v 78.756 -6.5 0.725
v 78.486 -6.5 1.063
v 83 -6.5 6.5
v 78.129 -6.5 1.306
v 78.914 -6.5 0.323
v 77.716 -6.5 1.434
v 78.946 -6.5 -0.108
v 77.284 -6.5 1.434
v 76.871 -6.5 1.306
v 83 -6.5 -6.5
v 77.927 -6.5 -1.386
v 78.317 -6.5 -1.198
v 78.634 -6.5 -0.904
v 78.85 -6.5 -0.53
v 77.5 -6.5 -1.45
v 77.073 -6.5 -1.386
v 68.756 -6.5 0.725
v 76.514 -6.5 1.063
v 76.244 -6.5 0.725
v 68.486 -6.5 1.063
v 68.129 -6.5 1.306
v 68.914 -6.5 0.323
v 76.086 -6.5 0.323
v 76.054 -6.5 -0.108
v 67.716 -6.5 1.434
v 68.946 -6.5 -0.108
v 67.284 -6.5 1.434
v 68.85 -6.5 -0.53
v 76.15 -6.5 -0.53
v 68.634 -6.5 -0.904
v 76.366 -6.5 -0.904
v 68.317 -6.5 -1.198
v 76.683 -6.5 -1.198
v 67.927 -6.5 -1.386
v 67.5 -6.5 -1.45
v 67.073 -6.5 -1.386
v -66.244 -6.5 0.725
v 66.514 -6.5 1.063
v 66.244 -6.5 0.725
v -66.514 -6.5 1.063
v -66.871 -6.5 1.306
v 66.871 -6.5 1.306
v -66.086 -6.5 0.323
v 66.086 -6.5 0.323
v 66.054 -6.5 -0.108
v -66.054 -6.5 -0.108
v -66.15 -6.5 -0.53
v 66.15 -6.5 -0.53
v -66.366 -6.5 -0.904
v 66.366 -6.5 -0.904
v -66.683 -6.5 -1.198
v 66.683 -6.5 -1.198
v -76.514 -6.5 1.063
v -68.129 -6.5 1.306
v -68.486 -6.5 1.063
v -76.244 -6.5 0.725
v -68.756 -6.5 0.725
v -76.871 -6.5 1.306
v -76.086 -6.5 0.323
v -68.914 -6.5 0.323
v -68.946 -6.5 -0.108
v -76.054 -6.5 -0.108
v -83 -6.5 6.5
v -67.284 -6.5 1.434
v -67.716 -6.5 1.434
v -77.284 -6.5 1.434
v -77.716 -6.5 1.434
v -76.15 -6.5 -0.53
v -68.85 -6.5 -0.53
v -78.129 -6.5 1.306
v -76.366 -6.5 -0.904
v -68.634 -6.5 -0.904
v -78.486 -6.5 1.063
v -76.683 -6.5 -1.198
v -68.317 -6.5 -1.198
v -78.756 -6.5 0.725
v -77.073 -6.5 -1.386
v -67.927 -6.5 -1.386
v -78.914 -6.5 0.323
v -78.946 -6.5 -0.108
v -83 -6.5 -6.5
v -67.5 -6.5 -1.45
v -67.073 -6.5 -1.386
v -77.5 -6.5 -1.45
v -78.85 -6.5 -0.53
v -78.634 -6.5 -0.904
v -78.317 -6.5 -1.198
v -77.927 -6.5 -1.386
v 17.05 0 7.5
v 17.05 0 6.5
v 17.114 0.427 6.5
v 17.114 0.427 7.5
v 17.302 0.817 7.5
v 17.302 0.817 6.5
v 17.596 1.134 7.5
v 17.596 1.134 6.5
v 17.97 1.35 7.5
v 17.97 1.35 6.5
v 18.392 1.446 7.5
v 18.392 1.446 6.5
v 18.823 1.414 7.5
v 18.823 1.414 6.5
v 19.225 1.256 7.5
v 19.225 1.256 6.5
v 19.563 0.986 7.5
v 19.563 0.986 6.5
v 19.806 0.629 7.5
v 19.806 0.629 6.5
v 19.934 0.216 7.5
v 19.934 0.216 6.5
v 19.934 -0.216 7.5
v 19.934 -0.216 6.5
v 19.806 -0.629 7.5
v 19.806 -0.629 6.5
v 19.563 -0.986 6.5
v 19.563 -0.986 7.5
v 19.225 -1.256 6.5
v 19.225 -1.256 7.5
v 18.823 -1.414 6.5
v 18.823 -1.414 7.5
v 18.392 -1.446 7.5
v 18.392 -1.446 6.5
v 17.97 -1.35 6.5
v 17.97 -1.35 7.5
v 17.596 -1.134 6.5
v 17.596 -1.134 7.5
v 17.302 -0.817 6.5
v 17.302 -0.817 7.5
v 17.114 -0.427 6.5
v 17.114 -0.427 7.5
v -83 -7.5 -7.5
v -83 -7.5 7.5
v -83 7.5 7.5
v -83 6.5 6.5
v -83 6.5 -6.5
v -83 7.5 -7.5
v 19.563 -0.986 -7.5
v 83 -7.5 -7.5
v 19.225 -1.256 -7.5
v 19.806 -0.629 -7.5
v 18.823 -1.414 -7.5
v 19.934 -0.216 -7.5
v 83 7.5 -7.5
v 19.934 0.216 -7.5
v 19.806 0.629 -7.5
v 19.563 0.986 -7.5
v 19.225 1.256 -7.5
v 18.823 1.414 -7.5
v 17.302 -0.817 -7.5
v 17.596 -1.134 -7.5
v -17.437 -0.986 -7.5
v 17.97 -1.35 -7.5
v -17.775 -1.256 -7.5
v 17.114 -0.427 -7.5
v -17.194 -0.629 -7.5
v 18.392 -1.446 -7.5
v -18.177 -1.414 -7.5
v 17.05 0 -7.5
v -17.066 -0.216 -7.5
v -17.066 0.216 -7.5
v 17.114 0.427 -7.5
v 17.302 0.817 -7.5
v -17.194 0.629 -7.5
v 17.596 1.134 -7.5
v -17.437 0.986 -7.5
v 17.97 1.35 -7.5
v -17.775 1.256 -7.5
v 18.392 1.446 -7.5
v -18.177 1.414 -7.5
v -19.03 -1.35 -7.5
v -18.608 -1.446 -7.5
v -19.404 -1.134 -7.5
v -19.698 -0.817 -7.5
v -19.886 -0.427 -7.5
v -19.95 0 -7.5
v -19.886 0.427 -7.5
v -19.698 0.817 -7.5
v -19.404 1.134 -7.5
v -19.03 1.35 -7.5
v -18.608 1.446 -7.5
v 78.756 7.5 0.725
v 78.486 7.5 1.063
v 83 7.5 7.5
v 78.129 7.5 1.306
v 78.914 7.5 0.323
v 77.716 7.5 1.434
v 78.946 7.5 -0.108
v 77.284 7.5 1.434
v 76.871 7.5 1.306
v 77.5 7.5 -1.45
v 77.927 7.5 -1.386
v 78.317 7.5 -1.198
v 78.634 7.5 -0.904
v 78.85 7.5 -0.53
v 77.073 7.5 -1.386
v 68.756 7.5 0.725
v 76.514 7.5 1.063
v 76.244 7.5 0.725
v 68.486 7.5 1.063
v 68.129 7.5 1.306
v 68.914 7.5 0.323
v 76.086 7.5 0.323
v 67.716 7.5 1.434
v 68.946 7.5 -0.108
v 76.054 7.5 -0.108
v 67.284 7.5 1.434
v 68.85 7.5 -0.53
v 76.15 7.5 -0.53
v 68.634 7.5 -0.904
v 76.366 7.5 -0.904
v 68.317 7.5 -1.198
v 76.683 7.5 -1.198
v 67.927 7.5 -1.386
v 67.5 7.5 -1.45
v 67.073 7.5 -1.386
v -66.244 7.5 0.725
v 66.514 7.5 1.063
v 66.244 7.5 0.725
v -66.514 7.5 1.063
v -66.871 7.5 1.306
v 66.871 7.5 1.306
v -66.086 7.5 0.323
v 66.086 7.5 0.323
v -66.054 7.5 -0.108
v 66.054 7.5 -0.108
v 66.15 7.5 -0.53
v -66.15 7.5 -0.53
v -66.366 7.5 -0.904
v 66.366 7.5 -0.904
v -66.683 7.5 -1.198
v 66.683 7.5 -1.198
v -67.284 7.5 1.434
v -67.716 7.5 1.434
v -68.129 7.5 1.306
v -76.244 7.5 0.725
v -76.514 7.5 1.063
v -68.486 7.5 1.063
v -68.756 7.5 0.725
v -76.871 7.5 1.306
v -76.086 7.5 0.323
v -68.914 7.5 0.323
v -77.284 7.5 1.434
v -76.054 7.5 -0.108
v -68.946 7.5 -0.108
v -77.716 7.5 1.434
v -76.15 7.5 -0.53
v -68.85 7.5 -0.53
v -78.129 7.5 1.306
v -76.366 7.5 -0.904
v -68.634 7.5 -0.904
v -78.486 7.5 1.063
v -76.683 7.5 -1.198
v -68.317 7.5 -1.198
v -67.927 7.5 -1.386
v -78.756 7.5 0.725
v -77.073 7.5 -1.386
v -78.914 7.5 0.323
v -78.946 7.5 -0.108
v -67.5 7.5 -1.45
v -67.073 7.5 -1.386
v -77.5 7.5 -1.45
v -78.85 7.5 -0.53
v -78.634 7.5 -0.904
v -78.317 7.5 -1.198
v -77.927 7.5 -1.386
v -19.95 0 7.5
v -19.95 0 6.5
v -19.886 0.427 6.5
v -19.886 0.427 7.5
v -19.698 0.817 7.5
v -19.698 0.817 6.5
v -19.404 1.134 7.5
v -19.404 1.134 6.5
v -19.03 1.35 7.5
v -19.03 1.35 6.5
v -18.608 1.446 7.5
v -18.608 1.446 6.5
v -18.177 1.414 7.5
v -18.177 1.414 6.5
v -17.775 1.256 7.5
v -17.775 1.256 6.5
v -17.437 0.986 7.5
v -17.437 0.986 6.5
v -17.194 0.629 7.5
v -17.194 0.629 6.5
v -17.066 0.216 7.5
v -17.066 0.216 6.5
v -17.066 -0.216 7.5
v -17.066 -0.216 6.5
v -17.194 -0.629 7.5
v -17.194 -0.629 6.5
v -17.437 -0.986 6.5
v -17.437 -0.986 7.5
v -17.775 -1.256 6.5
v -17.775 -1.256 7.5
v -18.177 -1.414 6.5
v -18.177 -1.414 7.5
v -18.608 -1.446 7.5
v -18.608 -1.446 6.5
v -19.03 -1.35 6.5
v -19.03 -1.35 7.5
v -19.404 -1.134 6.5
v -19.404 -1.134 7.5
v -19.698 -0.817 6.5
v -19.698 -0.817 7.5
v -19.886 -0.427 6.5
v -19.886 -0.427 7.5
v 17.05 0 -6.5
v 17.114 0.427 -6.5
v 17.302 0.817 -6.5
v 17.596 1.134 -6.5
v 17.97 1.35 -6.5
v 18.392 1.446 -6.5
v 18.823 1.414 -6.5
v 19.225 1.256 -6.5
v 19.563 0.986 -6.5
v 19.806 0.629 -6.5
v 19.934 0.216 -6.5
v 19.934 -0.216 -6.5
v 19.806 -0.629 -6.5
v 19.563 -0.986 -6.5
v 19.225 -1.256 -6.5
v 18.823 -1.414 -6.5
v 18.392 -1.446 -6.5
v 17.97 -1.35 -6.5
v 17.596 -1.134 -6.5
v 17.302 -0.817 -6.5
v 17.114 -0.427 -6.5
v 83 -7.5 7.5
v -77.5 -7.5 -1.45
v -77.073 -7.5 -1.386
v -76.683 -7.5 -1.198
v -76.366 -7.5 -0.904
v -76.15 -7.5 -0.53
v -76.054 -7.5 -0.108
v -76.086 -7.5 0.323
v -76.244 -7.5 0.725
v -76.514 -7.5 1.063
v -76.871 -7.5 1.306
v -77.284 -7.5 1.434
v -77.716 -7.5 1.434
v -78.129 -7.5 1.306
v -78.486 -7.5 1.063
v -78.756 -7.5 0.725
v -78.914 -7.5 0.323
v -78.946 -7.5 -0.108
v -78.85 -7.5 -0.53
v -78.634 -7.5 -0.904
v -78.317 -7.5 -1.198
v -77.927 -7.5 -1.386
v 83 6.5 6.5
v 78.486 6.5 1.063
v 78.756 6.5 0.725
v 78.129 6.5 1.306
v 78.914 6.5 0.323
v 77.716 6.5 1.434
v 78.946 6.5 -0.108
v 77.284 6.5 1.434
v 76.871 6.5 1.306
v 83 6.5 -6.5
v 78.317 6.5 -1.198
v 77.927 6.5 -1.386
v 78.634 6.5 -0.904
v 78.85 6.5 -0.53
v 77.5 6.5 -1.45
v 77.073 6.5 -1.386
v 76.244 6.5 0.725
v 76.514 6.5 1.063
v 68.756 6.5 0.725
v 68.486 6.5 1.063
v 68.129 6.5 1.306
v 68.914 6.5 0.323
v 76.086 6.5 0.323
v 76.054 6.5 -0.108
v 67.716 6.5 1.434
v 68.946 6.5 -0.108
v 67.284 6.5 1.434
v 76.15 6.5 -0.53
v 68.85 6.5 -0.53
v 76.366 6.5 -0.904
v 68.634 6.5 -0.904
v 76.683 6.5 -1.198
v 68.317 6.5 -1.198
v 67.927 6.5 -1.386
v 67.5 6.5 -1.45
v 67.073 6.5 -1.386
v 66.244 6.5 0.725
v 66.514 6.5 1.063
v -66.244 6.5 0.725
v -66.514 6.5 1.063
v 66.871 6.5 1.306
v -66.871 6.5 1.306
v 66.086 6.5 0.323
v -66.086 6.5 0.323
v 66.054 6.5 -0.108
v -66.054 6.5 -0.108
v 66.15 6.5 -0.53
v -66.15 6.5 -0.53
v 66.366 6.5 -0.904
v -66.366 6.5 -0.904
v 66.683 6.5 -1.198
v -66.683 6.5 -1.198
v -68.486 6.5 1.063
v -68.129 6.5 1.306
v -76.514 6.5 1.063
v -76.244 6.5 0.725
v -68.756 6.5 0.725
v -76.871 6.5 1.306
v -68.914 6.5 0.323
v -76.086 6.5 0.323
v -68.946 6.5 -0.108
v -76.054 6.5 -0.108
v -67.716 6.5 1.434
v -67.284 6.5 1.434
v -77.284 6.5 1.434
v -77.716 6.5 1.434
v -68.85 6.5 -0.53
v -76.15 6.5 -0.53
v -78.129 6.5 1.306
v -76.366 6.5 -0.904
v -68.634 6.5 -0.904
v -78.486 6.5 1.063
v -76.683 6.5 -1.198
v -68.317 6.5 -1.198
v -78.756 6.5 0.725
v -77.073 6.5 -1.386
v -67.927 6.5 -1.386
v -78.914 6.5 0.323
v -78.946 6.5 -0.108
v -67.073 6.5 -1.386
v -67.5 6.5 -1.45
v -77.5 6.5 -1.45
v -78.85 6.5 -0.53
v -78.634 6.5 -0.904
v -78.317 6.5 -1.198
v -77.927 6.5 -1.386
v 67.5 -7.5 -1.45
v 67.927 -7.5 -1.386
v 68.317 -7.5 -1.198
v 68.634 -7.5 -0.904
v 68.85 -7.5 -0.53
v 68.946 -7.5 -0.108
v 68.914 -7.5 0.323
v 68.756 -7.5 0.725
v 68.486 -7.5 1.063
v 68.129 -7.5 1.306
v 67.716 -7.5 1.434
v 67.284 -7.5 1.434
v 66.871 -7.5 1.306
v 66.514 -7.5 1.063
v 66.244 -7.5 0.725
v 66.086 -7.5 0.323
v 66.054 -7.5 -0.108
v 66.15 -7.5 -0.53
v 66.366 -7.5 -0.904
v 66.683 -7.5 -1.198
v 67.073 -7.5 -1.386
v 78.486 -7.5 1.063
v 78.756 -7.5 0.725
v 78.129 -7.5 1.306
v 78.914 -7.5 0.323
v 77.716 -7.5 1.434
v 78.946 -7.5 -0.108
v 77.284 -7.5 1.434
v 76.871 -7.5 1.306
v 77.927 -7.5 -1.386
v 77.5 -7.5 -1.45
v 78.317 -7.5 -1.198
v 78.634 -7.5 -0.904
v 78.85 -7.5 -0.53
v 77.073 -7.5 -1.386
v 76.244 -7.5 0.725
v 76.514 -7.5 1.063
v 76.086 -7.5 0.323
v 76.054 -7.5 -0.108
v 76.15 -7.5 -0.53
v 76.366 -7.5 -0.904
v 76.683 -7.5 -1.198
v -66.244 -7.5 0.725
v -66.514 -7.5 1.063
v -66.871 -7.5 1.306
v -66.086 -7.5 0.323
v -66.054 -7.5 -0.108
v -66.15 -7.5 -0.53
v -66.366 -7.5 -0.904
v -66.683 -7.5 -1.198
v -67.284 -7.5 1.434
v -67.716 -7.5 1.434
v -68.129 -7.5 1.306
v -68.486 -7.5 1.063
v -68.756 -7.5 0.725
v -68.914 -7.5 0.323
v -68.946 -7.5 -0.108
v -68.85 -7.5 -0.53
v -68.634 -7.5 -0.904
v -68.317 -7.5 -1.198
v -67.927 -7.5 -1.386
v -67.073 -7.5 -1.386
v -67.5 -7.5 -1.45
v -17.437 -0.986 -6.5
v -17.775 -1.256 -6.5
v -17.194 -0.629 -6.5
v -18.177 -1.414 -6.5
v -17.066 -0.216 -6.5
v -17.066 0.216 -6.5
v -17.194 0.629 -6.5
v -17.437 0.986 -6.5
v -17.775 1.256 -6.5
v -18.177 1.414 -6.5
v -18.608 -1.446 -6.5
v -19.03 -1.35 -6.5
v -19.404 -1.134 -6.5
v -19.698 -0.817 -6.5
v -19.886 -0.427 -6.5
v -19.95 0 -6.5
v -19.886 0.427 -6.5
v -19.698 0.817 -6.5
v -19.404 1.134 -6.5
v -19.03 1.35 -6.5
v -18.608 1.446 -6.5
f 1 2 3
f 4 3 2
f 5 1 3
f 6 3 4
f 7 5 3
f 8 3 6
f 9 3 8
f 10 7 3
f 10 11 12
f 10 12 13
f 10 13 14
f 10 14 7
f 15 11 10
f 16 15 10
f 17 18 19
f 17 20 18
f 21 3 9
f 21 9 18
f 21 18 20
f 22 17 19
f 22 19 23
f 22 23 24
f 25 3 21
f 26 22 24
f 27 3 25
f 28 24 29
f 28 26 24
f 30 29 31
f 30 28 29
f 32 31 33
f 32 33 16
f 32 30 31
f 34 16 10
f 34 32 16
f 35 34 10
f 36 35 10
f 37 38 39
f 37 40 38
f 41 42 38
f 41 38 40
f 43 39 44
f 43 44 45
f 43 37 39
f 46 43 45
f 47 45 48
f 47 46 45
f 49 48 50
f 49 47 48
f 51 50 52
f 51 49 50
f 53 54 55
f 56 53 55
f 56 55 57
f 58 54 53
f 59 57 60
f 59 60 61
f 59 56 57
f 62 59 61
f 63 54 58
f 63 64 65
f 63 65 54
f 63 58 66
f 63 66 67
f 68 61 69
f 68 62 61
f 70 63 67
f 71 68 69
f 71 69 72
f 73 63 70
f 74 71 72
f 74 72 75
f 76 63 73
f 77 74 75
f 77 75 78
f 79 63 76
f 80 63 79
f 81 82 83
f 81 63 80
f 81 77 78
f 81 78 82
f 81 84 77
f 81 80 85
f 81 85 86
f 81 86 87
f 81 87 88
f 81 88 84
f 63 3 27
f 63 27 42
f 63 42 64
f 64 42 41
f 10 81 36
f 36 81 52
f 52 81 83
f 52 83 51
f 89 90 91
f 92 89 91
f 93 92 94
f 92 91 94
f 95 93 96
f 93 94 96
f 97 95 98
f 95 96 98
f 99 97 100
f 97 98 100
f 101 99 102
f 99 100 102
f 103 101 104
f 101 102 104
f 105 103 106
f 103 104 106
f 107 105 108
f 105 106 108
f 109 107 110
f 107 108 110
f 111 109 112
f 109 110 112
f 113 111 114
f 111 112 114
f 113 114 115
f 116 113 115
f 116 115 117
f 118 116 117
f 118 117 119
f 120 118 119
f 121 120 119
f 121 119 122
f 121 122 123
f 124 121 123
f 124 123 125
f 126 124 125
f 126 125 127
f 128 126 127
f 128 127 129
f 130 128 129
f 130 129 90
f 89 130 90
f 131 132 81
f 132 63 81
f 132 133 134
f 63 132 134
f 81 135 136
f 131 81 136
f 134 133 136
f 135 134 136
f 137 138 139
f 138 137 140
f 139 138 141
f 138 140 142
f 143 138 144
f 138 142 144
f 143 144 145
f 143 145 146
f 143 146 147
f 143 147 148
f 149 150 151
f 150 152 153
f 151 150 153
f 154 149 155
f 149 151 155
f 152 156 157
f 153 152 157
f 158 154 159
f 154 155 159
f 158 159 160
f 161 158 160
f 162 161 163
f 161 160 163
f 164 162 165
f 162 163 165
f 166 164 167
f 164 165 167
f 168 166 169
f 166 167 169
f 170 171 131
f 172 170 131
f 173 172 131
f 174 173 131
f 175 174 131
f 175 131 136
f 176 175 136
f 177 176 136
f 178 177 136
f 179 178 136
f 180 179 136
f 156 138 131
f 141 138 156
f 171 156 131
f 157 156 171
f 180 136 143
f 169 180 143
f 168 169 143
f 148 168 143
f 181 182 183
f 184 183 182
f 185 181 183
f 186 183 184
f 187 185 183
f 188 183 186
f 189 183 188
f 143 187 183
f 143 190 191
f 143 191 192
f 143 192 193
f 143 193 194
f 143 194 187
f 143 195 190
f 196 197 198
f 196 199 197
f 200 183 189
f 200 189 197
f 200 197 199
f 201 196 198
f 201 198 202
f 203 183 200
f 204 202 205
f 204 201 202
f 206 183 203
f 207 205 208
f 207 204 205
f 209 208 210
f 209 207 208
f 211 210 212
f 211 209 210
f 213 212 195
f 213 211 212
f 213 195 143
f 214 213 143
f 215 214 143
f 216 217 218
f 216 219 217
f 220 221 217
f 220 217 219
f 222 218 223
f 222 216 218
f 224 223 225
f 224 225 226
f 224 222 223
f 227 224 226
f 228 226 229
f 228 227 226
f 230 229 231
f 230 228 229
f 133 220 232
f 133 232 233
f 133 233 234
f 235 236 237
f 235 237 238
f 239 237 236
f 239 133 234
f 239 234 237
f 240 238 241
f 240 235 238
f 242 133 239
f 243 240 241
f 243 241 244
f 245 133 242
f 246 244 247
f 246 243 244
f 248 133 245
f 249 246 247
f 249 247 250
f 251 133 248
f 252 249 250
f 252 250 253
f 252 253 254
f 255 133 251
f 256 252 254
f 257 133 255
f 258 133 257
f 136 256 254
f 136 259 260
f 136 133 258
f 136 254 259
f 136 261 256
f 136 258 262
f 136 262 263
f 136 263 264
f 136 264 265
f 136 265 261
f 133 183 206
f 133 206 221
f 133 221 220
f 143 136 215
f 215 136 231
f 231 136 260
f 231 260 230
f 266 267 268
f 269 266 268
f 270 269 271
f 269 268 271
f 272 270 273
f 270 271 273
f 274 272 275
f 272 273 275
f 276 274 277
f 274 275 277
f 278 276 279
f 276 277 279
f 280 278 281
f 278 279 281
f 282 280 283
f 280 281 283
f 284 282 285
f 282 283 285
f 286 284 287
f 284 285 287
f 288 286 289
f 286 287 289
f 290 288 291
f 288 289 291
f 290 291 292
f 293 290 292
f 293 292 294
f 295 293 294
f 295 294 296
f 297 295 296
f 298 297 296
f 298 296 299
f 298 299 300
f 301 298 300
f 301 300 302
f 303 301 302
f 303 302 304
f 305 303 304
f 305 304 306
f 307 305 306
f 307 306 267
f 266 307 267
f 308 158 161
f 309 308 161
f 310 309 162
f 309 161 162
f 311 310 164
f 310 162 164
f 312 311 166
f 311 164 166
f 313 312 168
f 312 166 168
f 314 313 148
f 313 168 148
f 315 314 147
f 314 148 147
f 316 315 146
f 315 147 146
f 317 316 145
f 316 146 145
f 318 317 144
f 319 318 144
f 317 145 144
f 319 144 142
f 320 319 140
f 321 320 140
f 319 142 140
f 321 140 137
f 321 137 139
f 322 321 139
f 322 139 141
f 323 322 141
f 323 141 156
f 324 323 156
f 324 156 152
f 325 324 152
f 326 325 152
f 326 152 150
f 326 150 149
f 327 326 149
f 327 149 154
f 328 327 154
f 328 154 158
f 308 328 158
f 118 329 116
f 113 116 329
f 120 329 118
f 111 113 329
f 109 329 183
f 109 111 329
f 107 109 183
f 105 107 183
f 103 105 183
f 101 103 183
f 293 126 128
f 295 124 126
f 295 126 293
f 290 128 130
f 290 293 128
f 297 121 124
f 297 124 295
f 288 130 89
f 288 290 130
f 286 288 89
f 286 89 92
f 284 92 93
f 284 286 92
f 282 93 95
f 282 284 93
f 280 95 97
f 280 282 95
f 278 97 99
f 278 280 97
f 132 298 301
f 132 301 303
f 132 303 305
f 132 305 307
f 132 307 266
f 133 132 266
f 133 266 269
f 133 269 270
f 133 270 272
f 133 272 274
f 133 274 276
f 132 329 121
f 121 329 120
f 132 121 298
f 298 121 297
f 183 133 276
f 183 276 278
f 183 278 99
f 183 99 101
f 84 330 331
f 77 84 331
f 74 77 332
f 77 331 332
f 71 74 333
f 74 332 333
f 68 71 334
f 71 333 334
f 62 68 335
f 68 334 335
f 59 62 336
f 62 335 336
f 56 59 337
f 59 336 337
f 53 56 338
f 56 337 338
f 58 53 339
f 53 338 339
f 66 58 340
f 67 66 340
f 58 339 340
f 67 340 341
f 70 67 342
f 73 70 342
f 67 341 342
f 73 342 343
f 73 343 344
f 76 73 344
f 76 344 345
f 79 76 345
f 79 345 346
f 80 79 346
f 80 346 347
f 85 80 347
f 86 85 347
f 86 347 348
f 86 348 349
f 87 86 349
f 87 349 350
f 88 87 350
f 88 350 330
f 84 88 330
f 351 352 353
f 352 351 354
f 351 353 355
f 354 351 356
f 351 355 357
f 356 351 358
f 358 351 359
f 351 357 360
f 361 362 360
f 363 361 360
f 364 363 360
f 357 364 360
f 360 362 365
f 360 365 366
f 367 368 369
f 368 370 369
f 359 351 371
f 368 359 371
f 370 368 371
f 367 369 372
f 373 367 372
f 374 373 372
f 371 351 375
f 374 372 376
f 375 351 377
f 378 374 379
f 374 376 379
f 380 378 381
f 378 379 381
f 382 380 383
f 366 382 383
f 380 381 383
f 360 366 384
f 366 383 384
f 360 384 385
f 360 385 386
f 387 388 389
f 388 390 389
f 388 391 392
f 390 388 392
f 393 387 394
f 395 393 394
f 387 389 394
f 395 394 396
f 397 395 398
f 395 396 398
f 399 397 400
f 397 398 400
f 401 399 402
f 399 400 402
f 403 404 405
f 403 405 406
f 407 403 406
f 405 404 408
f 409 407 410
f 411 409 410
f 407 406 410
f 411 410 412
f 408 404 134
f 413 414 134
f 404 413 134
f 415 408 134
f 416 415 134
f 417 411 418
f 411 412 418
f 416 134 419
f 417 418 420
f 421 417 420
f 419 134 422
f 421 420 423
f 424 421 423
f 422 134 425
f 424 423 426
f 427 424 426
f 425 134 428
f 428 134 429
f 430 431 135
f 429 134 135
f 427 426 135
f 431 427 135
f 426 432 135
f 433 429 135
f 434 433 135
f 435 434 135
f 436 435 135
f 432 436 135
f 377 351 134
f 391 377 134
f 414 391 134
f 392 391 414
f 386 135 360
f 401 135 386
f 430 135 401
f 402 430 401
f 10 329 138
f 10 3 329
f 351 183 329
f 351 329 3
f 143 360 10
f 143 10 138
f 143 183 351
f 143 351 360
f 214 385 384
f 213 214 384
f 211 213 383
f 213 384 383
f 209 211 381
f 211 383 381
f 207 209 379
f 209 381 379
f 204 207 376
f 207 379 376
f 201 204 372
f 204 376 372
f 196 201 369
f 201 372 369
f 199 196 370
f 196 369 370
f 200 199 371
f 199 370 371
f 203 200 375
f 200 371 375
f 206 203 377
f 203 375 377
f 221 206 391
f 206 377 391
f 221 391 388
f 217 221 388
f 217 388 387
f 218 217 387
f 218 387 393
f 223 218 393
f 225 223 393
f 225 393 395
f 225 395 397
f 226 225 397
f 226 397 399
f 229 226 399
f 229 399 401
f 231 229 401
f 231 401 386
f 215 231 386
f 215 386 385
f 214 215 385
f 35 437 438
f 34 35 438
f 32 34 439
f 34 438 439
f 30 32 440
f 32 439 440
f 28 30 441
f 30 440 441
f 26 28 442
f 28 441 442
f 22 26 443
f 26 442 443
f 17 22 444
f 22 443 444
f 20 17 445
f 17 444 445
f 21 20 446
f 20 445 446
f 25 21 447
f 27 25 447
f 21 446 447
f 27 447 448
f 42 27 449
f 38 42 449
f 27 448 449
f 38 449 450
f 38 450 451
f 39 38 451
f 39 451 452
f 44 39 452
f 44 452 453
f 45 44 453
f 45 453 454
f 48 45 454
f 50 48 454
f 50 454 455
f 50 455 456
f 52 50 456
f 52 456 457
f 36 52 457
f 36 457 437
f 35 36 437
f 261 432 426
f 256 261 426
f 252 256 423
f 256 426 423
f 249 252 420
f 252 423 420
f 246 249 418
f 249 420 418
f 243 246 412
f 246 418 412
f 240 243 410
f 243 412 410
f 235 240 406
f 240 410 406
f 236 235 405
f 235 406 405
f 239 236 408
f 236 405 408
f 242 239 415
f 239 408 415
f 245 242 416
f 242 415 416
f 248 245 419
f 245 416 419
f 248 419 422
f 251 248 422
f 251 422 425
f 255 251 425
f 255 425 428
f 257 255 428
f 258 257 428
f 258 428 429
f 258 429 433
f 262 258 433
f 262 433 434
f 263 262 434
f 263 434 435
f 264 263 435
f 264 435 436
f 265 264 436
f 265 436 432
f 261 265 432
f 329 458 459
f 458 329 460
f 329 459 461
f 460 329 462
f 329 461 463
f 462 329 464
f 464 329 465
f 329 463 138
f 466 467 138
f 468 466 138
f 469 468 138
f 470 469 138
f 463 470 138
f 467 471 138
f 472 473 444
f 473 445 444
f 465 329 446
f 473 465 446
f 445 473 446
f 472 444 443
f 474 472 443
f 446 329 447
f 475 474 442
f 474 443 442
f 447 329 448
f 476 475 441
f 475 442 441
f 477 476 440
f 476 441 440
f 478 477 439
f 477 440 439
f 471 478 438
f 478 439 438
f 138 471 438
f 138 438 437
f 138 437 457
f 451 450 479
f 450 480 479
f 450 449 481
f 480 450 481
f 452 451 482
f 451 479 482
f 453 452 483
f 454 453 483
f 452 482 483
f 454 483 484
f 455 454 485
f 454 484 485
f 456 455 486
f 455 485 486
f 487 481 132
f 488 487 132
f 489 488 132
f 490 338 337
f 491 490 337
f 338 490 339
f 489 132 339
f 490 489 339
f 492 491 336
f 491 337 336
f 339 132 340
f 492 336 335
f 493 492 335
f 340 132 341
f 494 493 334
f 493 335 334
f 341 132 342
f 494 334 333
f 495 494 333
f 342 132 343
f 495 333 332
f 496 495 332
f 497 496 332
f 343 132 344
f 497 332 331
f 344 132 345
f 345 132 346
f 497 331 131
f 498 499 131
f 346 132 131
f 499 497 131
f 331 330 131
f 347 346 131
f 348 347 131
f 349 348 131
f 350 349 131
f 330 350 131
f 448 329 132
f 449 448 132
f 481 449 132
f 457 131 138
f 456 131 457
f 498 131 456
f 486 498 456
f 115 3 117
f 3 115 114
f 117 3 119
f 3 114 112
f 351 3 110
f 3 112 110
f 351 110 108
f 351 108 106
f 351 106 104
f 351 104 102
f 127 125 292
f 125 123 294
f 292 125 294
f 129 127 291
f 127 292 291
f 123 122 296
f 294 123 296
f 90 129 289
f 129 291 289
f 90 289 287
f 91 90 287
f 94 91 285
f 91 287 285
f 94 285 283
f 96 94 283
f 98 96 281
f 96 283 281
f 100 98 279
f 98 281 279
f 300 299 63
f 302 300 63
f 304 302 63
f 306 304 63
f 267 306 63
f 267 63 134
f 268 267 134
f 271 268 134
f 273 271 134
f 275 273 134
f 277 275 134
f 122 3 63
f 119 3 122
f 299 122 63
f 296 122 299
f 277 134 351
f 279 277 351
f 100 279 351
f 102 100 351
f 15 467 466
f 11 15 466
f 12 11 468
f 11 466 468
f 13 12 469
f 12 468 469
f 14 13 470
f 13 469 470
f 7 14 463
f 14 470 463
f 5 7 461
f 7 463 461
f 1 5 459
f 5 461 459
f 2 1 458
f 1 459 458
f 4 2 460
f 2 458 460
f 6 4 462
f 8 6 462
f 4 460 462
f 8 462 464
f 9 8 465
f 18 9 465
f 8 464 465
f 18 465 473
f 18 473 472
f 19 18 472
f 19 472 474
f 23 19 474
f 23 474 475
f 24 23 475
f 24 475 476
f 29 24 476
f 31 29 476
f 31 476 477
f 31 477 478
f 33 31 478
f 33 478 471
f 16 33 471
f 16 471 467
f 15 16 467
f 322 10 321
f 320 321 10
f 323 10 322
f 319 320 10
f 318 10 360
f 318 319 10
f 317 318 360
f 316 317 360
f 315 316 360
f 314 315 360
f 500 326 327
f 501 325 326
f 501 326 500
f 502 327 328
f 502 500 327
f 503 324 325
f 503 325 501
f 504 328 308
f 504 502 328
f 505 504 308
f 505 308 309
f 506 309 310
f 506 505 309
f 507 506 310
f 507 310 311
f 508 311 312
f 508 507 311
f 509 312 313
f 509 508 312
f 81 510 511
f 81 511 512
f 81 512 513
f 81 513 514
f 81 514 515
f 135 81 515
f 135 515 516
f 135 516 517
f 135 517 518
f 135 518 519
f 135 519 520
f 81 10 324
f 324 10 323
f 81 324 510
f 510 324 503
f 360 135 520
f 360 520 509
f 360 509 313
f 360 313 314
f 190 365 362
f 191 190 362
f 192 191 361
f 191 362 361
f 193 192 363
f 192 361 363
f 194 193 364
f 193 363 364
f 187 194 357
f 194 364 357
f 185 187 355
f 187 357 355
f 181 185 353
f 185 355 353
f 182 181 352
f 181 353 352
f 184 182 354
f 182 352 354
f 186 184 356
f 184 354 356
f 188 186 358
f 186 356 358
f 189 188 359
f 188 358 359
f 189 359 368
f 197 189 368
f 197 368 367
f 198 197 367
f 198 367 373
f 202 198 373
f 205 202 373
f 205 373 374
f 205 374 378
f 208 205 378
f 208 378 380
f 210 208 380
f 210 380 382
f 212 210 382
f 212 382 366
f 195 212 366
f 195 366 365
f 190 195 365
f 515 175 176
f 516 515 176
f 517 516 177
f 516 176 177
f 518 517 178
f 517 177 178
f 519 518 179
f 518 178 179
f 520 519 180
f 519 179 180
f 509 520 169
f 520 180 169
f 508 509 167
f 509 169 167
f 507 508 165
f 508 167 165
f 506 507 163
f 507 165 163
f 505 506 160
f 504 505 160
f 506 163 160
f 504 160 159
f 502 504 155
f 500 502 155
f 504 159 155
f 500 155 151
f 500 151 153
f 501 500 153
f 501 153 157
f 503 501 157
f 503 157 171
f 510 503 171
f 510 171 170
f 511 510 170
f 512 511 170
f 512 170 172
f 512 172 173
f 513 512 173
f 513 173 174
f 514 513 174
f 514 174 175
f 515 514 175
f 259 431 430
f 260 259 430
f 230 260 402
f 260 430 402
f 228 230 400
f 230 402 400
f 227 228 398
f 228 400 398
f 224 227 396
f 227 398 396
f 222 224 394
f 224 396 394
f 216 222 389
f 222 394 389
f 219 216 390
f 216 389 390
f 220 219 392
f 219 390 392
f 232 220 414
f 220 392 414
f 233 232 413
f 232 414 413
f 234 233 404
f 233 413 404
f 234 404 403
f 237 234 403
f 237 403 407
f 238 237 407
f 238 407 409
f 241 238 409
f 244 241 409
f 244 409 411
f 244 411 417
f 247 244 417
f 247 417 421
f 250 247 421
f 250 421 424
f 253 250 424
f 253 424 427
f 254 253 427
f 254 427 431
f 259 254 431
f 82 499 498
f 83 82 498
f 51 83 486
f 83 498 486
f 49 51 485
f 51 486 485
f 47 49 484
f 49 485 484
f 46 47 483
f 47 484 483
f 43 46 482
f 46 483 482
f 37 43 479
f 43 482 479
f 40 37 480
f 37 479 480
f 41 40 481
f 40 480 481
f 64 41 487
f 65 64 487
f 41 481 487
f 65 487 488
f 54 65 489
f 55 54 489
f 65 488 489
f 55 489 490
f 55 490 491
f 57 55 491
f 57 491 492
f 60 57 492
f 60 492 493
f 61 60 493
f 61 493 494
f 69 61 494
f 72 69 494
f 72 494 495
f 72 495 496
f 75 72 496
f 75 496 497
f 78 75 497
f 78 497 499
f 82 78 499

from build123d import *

# Parameters (mm, degrees)
SKETCH_11_W         = 15
SKETCH_11_H         = 15
SKETCH_11_W_2       = 13
SKETCH_11_H_2       = 13
F_15X15X1_1_DEPTH   = 166
SKETCH_12_R         = 1.45
CUT_EXTRUDE_1_DEPTH = 85.677328725
SKETCH_13_R         = 1.45
CUT_EXTRUDE_2_DEPTH = 85.677328725


with BuildPart() as part:
    # 草图11 → 铝管 15X15X1(1) (new body)
    with BuildSketch(Plane(origin=(-83, 0, 0), x_dir=(0, 0, -1), z_dir=(1, 0, 0))):
        Rectangle(SKETCH_11_W, SKETCH_11_H)
        Rectangle(SKETCH_11_W_2, SKETCH_11_H_2, mode=Mode.SUBTRACT)
    extrude(amount=F_15X15X1_1_DEPTH)

    # 草图12 → 切除-拉伸1 (cut, through all)
    with BuildSketch(Plane(origin=(0, 0, -7.5), x_dir=(-1, 0, 0), z_dir=(0, 0, -1))):
        with Locations((-18.5, 0)):
            Circle(SKETCH_12_R)
        with Locations((18.5, 0)):
            Circle(SKETCH_12_R)
    extrude(amount=-CUT_EXTRUDE_1_DEPTH, mode=Mode.SUBTRACT)

    # 草图13 → 切除-拉伸2 (cut, through all)
    with BuildSketch(Plane.XZ.offset(7.5)):
        with Locations(Location((-77.5, 0, 0), (0, 0, 270))):
            Circle(SKETCH_13_R)
        with Locations(Location((-67.5, 0, 0), (0, 0, 270))):
            Circle(SKETCH_13_R)
        with Locations(Location((67.5, 0, 0), (0, 0, 270))):
            Circle(SKETCH_13_R)
        with Locations(Location((77.5, 0, 0), (0, 0, 270))):
            Circle(SKETCH_13_R)
    extrude(amount=-CUT_EXTRUDE_2_DEPTH, mode=Mode.SUBTRACT)


solid = part.part
